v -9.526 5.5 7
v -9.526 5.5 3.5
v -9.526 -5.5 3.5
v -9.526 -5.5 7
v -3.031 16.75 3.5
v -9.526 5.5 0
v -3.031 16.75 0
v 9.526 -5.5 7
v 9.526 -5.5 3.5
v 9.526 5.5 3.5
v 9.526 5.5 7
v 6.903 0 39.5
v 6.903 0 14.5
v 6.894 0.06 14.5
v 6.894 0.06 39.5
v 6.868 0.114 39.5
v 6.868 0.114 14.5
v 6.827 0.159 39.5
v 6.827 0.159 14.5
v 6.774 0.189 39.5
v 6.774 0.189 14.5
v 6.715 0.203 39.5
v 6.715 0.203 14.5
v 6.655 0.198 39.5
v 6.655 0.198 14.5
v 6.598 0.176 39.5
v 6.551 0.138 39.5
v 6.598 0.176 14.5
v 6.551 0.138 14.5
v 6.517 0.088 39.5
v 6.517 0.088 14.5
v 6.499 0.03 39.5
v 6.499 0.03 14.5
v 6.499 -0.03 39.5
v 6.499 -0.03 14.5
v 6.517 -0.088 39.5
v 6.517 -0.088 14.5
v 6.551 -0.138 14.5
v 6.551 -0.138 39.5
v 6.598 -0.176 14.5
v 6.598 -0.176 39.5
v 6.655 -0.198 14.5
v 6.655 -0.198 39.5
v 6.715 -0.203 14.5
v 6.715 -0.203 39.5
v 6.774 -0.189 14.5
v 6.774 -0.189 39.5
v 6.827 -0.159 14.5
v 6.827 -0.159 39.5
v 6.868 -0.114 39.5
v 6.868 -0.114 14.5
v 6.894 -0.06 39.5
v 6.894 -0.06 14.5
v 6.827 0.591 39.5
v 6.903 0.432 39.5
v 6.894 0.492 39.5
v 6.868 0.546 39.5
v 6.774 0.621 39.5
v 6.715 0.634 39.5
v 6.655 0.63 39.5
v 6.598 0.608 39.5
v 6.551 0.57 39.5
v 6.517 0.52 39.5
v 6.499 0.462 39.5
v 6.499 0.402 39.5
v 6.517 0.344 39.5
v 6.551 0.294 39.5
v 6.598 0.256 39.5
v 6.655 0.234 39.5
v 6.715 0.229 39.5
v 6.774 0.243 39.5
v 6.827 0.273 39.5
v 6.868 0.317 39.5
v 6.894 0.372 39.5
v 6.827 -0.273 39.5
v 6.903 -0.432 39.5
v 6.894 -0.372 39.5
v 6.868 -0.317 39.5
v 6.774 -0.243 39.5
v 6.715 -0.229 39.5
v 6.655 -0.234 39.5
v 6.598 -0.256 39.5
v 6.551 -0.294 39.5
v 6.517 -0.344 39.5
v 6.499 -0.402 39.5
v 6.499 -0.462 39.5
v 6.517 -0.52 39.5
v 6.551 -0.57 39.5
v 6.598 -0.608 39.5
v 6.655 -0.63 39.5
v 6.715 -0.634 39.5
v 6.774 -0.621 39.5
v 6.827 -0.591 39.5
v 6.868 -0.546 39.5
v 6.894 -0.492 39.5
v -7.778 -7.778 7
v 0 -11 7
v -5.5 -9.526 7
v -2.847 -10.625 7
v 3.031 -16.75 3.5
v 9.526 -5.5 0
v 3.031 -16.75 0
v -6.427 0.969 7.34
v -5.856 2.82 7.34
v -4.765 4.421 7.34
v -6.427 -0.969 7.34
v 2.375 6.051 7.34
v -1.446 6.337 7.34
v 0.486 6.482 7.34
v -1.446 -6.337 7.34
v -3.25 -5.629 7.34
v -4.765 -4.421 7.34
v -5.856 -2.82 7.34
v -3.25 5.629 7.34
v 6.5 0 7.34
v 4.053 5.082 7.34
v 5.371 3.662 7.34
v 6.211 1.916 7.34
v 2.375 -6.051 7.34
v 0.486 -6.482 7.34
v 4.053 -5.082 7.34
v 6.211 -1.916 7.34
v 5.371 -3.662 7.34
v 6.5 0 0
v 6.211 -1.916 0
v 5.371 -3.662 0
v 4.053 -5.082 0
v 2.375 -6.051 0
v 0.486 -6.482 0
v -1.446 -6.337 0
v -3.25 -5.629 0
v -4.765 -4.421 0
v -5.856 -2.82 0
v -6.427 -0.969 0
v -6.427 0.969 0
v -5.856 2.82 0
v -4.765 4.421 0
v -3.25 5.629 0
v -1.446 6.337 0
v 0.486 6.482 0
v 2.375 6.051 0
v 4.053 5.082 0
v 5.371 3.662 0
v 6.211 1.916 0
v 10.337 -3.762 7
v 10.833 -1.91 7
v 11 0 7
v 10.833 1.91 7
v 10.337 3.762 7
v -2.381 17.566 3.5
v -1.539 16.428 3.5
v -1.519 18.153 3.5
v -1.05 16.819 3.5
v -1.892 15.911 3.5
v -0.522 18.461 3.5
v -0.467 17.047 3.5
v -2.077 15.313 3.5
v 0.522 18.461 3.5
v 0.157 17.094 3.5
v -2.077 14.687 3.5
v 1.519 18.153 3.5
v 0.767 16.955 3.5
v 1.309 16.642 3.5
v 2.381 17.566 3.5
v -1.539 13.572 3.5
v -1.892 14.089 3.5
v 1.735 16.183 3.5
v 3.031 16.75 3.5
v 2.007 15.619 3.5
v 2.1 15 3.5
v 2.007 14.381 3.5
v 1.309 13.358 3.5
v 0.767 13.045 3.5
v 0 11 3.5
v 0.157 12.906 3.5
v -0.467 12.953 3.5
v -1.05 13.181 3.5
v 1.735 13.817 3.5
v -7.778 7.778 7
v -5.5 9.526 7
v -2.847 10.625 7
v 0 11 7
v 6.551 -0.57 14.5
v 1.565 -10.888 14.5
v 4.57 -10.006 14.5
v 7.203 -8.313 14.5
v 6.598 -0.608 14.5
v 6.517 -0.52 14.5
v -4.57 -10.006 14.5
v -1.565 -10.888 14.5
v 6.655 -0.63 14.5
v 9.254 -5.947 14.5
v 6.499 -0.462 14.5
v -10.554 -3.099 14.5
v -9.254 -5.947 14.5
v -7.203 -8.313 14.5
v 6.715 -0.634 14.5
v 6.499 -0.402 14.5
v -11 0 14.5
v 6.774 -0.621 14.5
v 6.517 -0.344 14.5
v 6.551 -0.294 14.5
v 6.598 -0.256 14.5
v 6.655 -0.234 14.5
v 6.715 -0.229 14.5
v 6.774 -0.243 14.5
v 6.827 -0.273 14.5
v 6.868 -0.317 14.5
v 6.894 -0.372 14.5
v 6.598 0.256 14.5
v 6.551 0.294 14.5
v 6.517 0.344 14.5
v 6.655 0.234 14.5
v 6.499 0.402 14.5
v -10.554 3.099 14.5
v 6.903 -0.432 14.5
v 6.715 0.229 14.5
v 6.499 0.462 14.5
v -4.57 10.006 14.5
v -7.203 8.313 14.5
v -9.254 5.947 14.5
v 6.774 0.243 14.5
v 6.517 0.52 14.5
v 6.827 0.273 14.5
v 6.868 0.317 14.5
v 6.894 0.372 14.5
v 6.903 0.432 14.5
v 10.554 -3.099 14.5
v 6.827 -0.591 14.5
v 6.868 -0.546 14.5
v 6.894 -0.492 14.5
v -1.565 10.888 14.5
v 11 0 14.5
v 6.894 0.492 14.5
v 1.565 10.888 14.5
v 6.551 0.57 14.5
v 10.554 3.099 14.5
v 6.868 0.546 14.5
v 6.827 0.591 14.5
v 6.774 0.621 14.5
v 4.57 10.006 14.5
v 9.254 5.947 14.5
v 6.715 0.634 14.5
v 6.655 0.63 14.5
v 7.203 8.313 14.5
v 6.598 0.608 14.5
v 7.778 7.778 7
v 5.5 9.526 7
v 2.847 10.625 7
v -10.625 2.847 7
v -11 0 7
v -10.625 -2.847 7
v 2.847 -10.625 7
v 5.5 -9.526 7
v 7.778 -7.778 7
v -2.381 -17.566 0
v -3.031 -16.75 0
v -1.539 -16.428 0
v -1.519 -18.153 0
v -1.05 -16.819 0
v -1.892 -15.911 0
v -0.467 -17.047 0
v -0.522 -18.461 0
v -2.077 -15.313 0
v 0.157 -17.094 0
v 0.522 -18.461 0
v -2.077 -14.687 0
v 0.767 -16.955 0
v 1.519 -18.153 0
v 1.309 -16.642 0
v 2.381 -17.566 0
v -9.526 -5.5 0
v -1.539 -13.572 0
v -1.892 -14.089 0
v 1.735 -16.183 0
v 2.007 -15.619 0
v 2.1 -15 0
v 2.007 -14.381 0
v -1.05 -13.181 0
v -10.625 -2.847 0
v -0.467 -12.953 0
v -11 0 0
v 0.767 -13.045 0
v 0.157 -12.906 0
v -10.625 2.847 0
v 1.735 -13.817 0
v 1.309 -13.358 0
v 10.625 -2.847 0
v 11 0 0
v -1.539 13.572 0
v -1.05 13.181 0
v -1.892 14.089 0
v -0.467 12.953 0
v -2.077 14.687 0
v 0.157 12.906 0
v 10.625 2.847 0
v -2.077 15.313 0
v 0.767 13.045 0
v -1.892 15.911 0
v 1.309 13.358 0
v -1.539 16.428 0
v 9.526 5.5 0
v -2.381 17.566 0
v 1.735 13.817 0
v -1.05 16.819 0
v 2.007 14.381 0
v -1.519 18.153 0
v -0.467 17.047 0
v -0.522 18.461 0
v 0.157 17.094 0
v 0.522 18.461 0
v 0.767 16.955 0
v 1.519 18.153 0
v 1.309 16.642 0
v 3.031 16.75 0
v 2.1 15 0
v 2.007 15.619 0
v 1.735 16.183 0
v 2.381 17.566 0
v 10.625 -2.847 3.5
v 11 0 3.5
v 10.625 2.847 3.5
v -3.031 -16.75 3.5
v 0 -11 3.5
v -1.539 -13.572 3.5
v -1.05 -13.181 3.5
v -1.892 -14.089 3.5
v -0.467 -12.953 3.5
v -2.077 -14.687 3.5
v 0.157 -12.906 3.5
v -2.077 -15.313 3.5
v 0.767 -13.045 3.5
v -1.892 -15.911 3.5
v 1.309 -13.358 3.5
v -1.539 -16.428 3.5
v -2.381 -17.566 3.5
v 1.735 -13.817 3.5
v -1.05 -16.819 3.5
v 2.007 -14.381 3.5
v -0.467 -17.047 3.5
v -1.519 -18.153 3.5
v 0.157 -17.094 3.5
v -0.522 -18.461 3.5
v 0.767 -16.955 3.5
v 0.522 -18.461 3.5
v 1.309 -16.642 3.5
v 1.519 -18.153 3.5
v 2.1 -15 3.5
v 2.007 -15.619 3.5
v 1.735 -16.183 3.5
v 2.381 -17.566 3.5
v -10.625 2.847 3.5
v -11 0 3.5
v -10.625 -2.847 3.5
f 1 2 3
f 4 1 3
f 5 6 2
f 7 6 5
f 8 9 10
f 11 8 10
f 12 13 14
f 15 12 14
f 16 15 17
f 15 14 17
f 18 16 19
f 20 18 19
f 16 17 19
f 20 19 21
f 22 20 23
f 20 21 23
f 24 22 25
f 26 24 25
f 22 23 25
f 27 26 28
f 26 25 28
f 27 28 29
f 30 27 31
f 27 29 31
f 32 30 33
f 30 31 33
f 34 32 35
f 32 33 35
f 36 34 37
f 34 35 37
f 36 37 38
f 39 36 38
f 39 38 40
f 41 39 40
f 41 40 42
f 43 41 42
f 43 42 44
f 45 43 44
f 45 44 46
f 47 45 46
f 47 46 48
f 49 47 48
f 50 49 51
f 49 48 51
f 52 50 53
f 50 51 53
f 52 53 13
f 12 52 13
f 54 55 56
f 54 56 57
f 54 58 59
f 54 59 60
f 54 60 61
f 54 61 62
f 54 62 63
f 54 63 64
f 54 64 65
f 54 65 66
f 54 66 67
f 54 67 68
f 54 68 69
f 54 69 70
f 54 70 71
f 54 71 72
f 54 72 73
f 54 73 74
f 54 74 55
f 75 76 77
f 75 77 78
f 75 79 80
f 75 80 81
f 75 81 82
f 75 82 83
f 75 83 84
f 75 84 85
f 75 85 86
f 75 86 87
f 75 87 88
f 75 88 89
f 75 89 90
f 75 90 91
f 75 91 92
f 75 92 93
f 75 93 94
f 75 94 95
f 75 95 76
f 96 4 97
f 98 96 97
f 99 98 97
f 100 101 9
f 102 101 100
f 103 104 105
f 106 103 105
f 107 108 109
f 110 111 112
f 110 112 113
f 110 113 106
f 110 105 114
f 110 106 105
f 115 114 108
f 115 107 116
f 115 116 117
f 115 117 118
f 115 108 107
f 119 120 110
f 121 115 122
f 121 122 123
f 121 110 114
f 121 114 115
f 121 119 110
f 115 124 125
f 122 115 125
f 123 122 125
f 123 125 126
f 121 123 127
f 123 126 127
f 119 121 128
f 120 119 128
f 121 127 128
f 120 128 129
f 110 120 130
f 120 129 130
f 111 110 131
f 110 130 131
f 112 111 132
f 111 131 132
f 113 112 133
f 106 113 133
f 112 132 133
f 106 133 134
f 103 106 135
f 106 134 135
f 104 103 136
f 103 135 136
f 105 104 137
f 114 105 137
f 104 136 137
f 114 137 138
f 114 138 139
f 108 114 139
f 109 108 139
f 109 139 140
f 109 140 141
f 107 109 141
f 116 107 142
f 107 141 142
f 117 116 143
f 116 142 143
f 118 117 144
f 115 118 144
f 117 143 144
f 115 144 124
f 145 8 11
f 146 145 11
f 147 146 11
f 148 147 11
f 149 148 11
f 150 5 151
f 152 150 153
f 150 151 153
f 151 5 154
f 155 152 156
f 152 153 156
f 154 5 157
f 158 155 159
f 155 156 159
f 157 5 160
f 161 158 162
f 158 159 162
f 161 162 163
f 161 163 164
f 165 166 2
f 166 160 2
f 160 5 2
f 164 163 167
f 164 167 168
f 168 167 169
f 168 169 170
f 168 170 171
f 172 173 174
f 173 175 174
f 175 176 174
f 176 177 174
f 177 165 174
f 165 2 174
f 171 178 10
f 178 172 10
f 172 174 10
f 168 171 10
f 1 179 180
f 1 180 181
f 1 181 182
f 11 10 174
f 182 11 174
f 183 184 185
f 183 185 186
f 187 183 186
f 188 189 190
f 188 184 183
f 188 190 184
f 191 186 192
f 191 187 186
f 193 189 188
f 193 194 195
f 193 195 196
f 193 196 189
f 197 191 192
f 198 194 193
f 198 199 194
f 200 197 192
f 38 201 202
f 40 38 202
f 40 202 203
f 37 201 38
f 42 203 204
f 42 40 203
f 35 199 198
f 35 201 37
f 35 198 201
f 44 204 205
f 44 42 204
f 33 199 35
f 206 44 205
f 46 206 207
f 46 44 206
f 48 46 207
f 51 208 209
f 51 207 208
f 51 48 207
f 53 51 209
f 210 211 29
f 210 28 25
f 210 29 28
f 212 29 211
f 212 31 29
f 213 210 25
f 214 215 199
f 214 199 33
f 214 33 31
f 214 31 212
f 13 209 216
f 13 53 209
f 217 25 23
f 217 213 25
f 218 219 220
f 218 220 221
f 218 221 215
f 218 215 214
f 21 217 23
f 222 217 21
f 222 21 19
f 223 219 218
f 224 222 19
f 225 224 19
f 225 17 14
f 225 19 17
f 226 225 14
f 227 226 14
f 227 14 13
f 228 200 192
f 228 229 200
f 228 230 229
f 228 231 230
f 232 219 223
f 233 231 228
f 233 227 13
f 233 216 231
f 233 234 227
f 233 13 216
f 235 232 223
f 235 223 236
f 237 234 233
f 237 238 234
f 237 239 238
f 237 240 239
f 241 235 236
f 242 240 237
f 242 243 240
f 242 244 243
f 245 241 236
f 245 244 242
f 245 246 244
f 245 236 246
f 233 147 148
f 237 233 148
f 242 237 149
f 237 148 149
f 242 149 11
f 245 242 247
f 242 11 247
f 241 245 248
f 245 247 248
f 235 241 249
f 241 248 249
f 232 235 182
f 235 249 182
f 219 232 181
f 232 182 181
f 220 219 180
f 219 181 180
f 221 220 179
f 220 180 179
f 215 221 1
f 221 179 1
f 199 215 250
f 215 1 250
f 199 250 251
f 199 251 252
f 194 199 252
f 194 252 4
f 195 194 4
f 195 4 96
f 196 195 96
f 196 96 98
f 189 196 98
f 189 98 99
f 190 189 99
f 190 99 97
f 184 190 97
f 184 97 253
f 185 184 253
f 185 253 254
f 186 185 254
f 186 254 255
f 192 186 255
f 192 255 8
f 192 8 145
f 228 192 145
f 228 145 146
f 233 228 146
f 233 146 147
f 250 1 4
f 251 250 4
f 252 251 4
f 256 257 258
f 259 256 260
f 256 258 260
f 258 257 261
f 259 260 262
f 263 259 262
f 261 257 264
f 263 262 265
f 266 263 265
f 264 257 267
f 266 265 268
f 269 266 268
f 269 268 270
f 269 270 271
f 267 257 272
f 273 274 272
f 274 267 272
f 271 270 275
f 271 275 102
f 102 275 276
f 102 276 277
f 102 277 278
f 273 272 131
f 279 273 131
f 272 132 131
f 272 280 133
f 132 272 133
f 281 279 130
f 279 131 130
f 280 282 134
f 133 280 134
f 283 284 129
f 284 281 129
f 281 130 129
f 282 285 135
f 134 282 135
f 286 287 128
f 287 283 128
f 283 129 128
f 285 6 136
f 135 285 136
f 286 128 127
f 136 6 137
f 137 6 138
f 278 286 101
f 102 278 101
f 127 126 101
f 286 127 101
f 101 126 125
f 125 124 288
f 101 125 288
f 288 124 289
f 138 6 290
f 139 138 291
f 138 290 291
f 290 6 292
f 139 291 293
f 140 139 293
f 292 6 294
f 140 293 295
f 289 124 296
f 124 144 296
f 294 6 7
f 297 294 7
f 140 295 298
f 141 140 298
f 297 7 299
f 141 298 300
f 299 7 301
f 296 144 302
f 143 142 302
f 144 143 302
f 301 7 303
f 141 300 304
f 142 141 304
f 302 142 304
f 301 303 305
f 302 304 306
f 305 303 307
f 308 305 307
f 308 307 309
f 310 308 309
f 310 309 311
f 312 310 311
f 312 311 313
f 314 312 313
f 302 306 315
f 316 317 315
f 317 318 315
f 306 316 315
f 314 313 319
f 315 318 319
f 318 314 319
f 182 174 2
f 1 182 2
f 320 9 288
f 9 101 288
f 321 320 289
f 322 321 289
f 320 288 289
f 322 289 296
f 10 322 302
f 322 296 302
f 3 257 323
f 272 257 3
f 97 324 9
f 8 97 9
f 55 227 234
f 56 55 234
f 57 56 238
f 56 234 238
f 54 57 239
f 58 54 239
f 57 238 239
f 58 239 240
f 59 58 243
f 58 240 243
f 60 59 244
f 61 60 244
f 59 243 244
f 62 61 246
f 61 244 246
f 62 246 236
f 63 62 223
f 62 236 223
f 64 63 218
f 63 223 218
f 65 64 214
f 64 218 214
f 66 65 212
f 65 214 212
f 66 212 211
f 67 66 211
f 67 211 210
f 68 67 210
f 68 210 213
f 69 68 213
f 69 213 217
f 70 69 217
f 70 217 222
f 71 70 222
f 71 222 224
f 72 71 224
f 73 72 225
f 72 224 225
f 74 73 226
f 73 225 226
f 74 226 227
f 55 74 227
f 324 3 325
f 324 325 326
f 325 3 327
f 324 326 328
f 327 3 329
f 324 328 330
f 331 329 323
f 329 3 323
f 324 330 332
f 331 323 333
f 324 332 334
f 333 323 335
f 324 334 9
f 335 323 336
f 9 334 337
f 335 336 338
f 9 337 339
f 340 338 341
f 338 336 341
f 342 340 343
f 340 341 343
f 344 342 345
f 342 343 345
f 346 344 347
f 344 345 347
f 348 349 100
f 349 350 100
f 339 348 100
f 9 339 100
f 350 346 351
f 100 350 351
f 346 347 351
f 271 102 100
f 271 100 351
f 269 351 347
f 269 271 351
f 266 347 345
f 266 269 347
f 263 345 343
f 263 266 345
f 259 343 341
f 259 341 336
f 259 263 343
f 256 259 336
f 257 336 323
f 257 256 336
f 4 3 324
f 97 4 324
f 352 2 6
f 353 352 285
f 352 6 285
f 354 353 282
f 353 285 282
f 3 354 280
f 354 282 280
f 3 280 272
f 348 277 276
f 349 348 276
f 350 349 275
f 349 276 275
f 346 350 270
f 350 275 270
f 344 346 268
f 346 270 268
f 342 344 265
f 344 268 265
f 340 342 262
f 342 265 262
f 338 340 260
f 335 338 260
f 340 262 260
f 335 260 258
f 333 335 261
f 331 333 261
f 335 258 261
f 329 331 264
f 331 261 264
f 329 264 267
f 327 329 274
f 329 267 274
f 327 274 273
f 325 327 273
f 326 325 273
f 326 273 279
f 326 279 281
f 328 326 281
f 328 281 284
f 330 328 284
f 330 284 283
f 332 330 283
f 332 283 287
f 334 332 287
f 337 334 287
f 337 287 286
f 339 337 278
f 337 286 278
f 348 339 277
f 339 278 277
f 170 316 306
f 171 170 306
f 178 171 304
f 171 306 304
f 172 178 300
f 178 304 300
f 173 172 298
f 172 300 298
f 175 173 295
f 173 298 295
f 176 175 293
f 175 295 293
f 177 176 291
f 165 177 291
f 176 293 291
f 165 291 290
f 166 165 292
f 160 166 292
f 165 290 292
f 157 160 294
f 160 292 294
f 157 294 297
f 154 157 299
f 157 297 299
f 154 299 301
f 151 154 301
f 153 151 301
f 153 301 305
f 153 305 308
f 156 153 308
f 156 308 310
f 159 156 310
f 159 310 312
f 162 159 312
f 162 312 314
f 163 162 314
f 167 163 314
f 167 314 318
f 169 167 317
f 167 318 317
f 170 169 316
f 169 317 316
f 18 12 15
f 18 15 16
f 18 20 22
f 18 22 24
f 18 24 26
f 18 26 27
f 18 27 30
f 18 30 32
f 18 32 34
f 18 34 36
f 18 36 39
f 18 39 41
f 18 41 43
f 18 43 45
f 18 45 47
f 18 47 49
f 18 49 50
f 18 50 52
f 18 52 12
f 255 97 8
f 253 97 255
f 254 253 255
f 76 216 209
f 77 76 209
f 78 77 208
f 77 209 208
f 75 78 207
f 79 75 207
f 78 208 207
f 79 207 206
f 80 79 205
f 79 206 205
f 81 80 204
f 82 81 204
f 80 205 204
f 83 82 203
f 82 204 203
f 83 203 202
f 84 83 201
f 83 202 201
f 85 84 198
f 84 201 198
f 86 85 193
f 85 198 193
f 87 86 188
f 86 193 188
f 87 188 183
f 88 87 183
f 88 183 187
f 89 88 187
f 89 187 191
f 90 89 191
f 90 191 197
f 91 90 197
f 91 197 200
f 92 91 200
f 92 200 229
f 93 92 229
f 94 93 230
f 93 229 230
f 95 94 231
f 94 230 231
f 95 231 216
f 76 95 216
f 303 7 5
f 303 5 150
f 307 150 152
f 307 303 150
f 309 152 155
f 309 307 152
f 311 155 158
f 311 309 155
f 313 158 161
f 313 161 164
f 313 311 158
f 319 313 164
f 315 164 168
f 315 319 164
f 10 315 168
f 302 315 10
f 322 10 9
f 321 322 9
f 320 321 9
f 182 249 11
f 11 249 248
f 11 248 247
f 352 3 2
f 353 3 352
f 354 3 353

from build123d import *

# Parameters (mm, degrees)
F0_R      = 11
F1_DEPTH  = 14.5
F2_R      = 2.1
F3_DEPTH  = 3.5
F4_R      = 11
F5_DEPTH  = 3.5
F7_DEPTH  = 3.5
F8_R      = 6.5
F9_DEPTH  = 7.34
F10_R     = 0.2032
F11_DEPTH = 25


# Not quite as in the source:
# - a pattern or mirror of a feature is missing from the dataset's text; its kind, count and spacing are read off the source's solid


with BuildPart() as f1:
    # F0 (on Top) → F1 (new body)
    with BuildSketch(Plane.XY):
        Circle(F0_R)
    extrude(amount=F1_DEPTH)

    # F2 (on face) → F3 (join)
    with BuildSketch(Plane(origin=(0, 0, 0), x_dir=(1, 0, 0), z_dir=(0, 0, -1))):
        with BuildLine():
            Line((9.5262794416, 5.5), (3.0310889132, 16.75))
            ThreePointArc((3.0310889132, 16.75), (0, 18.5), (-3.0310889132, 16.75))
            Line((-3.0310889132, 16.75), (-9.5262794416, 5.5))
            ThreePointArc((-9.5262794416, 5.5), (0, 11), (9.5262794416, 5.5))
        make_face()
        with Locations((0, 15)):
            Circle(F2_R, mode=Mode.SUBTRACT)
        with BuildLine():
            ThreePointArc((9.5262794416, -5.5), (0, -11), (-9.5262794416, -5.5))
            Line((-9.5262794416, -5.5), (-3.0310889132, -16.75))
            ThreePointArc((-3.0310889132, -16.75), (0, -18.5), (3.0310889132, -16.75))
            Line((3.0310889132, -16.75), (9.5262794416, -5.5))
        make_face()
        with Locations((0, -15)):
            Circle(F2_R, mode=Mode.SUBTRACT)
    f3 = extrude(amount=-F3_DEPTH)

    # F3_copies: F3 across plane
    add(f3.mirror(Plane(origin=(0, 0, 0), x_dir=(0, 0, -1), z_dir=(-1, 0, 0))))

    # F4 (on face) → F5 (cut)
    with BuildSketch(Plane.XY.offset(3.5)):
        Circle(F4_R)
    extrude(amount=F5_DEPTH, mode=Mode.SUBTRACT)

    # F6 (on face) → F7 (join)
    with BuildSketch(Plane.XY.offset(3.5)):
        Polygon((9.5262794416, 5.5), (0, 11), (-9.5262794416, 5.5), (-9.5262794416, -5.5), (0, -11), (9.5262794416, -5.5), align=None)
    extrude(amount=F7_DEPTH)

    # F8 (on face) → F9 (cut)
    with BuildSketch(Plane(origin=(0, 0, 0), x_dir=(1, 0, 0), z_dir=(0, 0, -1))):
        Circle(F8_R)
    extrude(amount=-F9_DEPTH, mode=Mode.SUBTRACT)

    # F10 (on face) → F11 (join)
    with BuildSketch(Plane.XY.offset(14.5)):
        with Locations((6.7, 0)):
            Circle(F10_R)
        with Locations((6.7, 0.4318)):
            Circle(F10_R)
        with Locations((6.7, -0.4318)):
            Circle(F10_R)
    extrude(amount=F11_DEPTH)


solid = f1.part
